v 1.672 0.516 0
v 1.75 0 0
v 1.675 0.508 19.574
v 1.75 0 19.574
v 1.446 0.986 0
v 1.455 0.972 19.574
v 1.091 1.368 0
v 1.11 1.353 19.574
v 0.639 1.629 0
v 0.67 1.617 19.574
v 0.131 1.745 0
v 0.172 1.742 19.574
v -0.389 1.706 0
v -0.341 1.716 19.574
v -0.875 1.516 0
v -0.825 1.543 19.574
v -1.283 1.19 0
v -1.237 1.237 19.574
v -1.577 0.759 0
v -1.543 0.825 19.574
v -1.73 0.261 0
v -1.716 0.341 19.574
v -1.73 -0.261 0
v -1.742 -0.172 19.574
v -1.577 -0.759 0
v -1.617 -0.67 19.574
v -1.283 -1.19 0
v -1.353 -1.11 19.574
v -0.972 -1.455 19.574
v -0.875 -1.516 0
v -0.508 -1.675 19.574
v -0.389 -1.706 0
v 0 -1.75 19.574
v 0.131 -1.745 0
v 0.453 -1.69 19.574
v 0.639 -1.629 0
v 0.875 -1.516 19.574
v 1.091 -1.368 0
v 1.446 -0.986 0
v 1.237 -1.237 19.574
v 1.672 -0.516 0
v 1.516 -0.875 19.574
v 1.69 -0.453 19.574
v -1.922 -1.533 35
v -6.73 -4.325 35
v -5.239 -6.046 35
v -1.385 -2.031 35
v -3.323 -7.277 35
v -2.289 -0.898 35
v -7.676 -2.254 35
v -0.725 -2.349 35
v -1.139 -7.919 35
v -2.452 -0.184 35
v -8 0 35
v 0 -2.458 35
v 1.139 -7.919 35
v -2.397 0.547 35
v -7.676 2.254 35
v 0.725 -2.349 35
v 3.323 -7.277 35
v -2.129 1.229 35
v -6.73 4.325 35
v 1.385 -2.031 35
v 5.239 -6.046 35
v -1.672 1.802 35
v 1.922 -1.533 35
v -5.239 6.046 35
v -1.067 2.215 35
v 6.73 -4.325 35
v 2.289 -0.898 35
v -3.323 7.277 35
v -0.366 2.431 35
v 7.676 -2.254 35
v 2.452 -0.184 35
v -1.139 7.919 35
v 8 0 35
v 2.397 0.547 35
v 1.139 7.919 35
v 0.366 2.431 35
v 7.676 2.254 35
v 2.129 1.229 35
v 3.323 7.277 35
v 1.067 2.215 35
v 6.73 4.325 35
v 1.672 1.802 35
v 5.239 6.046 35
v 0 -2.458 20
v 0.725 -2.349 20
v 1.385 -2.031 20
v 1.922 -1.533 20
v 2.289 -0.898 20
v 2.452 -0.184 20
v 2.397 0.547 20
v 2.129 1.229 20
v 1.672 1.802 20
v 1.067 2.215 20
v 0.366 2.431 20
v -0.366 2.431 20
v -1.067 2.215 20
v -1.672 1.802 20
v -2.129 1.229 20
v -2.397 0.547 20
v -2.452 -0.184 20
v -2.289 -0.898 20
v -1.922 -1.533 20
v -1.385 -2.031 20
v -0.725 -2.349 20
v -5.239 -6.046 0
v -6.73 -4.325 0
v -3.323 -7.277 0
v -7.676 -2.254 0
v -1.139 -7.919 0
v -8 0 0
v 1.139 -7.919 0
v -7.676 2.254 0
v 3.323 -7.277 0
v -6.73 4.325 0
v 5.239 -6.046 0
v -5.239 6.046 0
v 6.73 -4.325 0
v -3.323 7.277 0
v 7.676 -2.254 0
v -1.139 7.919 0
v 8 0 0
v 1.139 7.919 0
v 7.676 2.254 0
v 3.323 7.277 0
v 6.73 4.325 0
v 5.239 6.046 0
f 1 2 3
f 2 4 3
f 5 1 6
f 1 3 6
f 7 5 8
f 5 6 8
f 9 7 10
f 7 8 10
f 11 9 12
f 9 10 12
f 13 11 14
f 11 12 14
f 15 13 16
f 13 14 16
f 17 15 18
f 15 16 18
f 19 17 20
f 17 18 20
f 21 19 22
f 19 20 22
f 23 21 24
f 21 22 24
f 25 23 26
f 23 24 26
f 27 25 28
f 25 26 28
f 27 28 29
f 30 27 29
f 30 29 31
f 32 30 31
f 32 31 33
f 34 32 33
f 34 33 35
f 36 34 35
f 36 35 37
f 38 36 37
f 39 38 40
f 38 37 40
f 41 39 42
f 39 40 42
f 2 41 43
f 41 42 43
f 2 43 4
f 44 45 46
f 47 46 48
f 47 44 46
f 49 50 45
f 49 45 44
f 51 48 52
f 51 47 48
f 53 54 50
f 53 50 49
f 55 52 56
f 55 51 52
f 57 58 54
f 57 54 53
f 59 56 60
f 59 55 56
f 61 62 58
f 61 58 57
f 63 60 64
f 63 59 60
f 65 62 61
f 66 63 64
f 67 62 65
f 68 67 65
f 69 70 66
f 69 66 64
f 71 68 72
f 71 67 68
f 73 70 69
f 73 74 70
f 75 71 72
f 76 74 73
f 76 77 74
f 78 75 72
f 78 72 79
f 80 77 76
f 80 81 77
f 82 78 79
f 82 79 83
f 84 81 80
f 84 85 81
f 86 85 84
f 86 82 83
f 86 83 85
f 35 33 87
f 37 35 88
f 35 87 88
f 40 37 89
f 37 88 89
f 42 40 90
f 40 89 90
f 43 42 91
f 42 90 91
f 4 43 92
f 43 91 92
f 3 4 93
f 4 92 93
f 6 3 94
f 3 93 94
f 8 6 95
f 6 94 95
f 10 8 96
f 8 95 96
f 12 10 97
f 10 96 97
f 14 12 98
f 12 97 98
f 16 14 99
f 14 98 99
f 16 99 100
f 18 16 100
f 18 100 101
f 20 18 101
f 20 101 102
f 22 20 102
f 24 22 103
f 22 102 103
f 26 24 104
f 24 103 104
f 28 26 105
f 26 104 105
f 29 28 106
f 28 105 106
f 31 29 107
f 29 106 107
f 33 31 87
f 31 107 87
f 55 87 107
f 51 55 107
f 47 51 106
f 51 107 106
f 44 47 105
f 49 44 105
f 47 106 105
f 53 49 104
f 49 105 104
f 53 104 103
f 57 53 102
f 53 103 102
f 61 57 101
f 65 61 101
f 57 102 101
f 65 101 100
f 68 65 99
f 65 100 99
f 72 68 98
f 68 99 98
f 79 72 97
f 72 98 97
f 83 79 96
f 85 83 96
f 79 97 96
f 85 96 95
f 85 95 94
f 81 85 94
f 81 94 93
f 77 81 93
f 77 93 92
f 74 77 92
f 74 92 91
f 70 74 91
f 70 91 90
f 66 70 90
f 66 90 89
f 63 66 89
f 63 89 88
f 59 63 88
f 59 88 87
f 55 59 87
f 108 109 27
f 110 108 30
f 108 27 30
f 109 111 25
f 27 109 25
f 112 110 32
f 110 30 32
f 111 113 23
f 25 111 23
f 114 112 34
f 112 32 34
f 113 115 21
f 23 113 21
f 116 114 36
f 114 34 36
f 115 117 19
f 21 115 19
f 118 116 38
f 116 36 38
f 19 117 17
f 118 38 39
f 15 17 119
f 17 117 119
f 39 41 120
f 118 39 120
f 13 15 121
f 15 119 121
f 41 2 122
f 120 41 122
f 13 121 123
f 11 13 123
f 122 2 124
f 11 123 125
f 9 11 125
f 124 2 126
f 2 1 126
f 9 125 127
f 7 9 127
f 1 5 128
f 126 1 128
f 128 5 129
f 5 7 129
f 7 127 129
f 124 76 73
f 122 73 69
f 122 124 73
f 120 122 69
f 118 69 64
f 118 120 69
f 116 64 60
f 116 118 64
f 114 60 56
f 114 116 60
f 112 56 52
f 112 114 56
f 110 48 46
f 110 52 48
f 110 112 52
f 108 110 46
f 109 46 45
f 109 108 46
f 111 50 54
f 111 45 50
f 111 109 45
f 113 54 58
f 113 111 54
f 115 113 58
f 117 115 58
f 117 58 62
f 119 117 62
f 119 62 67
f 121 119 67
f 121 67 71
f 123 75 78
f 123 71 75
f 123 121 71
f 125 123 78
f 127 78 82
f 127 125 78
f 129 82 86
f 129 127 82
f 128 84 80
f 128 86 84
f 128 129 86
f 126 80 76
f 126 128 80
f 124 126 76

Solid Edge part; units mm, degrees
sketch "Sketch1" plane through (0, 0, 0) normal (0, 0, 1) x (1, 0, 0)
  circle A0 centre (0, 0) radius 8
extrude "Protrusion1" add sketch "Sketch1" along normal blind 35
sketch "Sketch2" plane through (0, 0, 35) normal (0, 0, 1) x (1, 0, 0)
  circle A0 centre (0, 0) radius 1.75
extrude "Cutout1" cut sketch "Sketch2" against normal through all
hole "Hole_1" at (0, 0, 35) direction (0, 0, -1) diameter 4.917 depth 15 tip angle 118 thread major 6 thread length 15
extrude "Cutout2" [suppressed]
properties material "Polyurethene"
